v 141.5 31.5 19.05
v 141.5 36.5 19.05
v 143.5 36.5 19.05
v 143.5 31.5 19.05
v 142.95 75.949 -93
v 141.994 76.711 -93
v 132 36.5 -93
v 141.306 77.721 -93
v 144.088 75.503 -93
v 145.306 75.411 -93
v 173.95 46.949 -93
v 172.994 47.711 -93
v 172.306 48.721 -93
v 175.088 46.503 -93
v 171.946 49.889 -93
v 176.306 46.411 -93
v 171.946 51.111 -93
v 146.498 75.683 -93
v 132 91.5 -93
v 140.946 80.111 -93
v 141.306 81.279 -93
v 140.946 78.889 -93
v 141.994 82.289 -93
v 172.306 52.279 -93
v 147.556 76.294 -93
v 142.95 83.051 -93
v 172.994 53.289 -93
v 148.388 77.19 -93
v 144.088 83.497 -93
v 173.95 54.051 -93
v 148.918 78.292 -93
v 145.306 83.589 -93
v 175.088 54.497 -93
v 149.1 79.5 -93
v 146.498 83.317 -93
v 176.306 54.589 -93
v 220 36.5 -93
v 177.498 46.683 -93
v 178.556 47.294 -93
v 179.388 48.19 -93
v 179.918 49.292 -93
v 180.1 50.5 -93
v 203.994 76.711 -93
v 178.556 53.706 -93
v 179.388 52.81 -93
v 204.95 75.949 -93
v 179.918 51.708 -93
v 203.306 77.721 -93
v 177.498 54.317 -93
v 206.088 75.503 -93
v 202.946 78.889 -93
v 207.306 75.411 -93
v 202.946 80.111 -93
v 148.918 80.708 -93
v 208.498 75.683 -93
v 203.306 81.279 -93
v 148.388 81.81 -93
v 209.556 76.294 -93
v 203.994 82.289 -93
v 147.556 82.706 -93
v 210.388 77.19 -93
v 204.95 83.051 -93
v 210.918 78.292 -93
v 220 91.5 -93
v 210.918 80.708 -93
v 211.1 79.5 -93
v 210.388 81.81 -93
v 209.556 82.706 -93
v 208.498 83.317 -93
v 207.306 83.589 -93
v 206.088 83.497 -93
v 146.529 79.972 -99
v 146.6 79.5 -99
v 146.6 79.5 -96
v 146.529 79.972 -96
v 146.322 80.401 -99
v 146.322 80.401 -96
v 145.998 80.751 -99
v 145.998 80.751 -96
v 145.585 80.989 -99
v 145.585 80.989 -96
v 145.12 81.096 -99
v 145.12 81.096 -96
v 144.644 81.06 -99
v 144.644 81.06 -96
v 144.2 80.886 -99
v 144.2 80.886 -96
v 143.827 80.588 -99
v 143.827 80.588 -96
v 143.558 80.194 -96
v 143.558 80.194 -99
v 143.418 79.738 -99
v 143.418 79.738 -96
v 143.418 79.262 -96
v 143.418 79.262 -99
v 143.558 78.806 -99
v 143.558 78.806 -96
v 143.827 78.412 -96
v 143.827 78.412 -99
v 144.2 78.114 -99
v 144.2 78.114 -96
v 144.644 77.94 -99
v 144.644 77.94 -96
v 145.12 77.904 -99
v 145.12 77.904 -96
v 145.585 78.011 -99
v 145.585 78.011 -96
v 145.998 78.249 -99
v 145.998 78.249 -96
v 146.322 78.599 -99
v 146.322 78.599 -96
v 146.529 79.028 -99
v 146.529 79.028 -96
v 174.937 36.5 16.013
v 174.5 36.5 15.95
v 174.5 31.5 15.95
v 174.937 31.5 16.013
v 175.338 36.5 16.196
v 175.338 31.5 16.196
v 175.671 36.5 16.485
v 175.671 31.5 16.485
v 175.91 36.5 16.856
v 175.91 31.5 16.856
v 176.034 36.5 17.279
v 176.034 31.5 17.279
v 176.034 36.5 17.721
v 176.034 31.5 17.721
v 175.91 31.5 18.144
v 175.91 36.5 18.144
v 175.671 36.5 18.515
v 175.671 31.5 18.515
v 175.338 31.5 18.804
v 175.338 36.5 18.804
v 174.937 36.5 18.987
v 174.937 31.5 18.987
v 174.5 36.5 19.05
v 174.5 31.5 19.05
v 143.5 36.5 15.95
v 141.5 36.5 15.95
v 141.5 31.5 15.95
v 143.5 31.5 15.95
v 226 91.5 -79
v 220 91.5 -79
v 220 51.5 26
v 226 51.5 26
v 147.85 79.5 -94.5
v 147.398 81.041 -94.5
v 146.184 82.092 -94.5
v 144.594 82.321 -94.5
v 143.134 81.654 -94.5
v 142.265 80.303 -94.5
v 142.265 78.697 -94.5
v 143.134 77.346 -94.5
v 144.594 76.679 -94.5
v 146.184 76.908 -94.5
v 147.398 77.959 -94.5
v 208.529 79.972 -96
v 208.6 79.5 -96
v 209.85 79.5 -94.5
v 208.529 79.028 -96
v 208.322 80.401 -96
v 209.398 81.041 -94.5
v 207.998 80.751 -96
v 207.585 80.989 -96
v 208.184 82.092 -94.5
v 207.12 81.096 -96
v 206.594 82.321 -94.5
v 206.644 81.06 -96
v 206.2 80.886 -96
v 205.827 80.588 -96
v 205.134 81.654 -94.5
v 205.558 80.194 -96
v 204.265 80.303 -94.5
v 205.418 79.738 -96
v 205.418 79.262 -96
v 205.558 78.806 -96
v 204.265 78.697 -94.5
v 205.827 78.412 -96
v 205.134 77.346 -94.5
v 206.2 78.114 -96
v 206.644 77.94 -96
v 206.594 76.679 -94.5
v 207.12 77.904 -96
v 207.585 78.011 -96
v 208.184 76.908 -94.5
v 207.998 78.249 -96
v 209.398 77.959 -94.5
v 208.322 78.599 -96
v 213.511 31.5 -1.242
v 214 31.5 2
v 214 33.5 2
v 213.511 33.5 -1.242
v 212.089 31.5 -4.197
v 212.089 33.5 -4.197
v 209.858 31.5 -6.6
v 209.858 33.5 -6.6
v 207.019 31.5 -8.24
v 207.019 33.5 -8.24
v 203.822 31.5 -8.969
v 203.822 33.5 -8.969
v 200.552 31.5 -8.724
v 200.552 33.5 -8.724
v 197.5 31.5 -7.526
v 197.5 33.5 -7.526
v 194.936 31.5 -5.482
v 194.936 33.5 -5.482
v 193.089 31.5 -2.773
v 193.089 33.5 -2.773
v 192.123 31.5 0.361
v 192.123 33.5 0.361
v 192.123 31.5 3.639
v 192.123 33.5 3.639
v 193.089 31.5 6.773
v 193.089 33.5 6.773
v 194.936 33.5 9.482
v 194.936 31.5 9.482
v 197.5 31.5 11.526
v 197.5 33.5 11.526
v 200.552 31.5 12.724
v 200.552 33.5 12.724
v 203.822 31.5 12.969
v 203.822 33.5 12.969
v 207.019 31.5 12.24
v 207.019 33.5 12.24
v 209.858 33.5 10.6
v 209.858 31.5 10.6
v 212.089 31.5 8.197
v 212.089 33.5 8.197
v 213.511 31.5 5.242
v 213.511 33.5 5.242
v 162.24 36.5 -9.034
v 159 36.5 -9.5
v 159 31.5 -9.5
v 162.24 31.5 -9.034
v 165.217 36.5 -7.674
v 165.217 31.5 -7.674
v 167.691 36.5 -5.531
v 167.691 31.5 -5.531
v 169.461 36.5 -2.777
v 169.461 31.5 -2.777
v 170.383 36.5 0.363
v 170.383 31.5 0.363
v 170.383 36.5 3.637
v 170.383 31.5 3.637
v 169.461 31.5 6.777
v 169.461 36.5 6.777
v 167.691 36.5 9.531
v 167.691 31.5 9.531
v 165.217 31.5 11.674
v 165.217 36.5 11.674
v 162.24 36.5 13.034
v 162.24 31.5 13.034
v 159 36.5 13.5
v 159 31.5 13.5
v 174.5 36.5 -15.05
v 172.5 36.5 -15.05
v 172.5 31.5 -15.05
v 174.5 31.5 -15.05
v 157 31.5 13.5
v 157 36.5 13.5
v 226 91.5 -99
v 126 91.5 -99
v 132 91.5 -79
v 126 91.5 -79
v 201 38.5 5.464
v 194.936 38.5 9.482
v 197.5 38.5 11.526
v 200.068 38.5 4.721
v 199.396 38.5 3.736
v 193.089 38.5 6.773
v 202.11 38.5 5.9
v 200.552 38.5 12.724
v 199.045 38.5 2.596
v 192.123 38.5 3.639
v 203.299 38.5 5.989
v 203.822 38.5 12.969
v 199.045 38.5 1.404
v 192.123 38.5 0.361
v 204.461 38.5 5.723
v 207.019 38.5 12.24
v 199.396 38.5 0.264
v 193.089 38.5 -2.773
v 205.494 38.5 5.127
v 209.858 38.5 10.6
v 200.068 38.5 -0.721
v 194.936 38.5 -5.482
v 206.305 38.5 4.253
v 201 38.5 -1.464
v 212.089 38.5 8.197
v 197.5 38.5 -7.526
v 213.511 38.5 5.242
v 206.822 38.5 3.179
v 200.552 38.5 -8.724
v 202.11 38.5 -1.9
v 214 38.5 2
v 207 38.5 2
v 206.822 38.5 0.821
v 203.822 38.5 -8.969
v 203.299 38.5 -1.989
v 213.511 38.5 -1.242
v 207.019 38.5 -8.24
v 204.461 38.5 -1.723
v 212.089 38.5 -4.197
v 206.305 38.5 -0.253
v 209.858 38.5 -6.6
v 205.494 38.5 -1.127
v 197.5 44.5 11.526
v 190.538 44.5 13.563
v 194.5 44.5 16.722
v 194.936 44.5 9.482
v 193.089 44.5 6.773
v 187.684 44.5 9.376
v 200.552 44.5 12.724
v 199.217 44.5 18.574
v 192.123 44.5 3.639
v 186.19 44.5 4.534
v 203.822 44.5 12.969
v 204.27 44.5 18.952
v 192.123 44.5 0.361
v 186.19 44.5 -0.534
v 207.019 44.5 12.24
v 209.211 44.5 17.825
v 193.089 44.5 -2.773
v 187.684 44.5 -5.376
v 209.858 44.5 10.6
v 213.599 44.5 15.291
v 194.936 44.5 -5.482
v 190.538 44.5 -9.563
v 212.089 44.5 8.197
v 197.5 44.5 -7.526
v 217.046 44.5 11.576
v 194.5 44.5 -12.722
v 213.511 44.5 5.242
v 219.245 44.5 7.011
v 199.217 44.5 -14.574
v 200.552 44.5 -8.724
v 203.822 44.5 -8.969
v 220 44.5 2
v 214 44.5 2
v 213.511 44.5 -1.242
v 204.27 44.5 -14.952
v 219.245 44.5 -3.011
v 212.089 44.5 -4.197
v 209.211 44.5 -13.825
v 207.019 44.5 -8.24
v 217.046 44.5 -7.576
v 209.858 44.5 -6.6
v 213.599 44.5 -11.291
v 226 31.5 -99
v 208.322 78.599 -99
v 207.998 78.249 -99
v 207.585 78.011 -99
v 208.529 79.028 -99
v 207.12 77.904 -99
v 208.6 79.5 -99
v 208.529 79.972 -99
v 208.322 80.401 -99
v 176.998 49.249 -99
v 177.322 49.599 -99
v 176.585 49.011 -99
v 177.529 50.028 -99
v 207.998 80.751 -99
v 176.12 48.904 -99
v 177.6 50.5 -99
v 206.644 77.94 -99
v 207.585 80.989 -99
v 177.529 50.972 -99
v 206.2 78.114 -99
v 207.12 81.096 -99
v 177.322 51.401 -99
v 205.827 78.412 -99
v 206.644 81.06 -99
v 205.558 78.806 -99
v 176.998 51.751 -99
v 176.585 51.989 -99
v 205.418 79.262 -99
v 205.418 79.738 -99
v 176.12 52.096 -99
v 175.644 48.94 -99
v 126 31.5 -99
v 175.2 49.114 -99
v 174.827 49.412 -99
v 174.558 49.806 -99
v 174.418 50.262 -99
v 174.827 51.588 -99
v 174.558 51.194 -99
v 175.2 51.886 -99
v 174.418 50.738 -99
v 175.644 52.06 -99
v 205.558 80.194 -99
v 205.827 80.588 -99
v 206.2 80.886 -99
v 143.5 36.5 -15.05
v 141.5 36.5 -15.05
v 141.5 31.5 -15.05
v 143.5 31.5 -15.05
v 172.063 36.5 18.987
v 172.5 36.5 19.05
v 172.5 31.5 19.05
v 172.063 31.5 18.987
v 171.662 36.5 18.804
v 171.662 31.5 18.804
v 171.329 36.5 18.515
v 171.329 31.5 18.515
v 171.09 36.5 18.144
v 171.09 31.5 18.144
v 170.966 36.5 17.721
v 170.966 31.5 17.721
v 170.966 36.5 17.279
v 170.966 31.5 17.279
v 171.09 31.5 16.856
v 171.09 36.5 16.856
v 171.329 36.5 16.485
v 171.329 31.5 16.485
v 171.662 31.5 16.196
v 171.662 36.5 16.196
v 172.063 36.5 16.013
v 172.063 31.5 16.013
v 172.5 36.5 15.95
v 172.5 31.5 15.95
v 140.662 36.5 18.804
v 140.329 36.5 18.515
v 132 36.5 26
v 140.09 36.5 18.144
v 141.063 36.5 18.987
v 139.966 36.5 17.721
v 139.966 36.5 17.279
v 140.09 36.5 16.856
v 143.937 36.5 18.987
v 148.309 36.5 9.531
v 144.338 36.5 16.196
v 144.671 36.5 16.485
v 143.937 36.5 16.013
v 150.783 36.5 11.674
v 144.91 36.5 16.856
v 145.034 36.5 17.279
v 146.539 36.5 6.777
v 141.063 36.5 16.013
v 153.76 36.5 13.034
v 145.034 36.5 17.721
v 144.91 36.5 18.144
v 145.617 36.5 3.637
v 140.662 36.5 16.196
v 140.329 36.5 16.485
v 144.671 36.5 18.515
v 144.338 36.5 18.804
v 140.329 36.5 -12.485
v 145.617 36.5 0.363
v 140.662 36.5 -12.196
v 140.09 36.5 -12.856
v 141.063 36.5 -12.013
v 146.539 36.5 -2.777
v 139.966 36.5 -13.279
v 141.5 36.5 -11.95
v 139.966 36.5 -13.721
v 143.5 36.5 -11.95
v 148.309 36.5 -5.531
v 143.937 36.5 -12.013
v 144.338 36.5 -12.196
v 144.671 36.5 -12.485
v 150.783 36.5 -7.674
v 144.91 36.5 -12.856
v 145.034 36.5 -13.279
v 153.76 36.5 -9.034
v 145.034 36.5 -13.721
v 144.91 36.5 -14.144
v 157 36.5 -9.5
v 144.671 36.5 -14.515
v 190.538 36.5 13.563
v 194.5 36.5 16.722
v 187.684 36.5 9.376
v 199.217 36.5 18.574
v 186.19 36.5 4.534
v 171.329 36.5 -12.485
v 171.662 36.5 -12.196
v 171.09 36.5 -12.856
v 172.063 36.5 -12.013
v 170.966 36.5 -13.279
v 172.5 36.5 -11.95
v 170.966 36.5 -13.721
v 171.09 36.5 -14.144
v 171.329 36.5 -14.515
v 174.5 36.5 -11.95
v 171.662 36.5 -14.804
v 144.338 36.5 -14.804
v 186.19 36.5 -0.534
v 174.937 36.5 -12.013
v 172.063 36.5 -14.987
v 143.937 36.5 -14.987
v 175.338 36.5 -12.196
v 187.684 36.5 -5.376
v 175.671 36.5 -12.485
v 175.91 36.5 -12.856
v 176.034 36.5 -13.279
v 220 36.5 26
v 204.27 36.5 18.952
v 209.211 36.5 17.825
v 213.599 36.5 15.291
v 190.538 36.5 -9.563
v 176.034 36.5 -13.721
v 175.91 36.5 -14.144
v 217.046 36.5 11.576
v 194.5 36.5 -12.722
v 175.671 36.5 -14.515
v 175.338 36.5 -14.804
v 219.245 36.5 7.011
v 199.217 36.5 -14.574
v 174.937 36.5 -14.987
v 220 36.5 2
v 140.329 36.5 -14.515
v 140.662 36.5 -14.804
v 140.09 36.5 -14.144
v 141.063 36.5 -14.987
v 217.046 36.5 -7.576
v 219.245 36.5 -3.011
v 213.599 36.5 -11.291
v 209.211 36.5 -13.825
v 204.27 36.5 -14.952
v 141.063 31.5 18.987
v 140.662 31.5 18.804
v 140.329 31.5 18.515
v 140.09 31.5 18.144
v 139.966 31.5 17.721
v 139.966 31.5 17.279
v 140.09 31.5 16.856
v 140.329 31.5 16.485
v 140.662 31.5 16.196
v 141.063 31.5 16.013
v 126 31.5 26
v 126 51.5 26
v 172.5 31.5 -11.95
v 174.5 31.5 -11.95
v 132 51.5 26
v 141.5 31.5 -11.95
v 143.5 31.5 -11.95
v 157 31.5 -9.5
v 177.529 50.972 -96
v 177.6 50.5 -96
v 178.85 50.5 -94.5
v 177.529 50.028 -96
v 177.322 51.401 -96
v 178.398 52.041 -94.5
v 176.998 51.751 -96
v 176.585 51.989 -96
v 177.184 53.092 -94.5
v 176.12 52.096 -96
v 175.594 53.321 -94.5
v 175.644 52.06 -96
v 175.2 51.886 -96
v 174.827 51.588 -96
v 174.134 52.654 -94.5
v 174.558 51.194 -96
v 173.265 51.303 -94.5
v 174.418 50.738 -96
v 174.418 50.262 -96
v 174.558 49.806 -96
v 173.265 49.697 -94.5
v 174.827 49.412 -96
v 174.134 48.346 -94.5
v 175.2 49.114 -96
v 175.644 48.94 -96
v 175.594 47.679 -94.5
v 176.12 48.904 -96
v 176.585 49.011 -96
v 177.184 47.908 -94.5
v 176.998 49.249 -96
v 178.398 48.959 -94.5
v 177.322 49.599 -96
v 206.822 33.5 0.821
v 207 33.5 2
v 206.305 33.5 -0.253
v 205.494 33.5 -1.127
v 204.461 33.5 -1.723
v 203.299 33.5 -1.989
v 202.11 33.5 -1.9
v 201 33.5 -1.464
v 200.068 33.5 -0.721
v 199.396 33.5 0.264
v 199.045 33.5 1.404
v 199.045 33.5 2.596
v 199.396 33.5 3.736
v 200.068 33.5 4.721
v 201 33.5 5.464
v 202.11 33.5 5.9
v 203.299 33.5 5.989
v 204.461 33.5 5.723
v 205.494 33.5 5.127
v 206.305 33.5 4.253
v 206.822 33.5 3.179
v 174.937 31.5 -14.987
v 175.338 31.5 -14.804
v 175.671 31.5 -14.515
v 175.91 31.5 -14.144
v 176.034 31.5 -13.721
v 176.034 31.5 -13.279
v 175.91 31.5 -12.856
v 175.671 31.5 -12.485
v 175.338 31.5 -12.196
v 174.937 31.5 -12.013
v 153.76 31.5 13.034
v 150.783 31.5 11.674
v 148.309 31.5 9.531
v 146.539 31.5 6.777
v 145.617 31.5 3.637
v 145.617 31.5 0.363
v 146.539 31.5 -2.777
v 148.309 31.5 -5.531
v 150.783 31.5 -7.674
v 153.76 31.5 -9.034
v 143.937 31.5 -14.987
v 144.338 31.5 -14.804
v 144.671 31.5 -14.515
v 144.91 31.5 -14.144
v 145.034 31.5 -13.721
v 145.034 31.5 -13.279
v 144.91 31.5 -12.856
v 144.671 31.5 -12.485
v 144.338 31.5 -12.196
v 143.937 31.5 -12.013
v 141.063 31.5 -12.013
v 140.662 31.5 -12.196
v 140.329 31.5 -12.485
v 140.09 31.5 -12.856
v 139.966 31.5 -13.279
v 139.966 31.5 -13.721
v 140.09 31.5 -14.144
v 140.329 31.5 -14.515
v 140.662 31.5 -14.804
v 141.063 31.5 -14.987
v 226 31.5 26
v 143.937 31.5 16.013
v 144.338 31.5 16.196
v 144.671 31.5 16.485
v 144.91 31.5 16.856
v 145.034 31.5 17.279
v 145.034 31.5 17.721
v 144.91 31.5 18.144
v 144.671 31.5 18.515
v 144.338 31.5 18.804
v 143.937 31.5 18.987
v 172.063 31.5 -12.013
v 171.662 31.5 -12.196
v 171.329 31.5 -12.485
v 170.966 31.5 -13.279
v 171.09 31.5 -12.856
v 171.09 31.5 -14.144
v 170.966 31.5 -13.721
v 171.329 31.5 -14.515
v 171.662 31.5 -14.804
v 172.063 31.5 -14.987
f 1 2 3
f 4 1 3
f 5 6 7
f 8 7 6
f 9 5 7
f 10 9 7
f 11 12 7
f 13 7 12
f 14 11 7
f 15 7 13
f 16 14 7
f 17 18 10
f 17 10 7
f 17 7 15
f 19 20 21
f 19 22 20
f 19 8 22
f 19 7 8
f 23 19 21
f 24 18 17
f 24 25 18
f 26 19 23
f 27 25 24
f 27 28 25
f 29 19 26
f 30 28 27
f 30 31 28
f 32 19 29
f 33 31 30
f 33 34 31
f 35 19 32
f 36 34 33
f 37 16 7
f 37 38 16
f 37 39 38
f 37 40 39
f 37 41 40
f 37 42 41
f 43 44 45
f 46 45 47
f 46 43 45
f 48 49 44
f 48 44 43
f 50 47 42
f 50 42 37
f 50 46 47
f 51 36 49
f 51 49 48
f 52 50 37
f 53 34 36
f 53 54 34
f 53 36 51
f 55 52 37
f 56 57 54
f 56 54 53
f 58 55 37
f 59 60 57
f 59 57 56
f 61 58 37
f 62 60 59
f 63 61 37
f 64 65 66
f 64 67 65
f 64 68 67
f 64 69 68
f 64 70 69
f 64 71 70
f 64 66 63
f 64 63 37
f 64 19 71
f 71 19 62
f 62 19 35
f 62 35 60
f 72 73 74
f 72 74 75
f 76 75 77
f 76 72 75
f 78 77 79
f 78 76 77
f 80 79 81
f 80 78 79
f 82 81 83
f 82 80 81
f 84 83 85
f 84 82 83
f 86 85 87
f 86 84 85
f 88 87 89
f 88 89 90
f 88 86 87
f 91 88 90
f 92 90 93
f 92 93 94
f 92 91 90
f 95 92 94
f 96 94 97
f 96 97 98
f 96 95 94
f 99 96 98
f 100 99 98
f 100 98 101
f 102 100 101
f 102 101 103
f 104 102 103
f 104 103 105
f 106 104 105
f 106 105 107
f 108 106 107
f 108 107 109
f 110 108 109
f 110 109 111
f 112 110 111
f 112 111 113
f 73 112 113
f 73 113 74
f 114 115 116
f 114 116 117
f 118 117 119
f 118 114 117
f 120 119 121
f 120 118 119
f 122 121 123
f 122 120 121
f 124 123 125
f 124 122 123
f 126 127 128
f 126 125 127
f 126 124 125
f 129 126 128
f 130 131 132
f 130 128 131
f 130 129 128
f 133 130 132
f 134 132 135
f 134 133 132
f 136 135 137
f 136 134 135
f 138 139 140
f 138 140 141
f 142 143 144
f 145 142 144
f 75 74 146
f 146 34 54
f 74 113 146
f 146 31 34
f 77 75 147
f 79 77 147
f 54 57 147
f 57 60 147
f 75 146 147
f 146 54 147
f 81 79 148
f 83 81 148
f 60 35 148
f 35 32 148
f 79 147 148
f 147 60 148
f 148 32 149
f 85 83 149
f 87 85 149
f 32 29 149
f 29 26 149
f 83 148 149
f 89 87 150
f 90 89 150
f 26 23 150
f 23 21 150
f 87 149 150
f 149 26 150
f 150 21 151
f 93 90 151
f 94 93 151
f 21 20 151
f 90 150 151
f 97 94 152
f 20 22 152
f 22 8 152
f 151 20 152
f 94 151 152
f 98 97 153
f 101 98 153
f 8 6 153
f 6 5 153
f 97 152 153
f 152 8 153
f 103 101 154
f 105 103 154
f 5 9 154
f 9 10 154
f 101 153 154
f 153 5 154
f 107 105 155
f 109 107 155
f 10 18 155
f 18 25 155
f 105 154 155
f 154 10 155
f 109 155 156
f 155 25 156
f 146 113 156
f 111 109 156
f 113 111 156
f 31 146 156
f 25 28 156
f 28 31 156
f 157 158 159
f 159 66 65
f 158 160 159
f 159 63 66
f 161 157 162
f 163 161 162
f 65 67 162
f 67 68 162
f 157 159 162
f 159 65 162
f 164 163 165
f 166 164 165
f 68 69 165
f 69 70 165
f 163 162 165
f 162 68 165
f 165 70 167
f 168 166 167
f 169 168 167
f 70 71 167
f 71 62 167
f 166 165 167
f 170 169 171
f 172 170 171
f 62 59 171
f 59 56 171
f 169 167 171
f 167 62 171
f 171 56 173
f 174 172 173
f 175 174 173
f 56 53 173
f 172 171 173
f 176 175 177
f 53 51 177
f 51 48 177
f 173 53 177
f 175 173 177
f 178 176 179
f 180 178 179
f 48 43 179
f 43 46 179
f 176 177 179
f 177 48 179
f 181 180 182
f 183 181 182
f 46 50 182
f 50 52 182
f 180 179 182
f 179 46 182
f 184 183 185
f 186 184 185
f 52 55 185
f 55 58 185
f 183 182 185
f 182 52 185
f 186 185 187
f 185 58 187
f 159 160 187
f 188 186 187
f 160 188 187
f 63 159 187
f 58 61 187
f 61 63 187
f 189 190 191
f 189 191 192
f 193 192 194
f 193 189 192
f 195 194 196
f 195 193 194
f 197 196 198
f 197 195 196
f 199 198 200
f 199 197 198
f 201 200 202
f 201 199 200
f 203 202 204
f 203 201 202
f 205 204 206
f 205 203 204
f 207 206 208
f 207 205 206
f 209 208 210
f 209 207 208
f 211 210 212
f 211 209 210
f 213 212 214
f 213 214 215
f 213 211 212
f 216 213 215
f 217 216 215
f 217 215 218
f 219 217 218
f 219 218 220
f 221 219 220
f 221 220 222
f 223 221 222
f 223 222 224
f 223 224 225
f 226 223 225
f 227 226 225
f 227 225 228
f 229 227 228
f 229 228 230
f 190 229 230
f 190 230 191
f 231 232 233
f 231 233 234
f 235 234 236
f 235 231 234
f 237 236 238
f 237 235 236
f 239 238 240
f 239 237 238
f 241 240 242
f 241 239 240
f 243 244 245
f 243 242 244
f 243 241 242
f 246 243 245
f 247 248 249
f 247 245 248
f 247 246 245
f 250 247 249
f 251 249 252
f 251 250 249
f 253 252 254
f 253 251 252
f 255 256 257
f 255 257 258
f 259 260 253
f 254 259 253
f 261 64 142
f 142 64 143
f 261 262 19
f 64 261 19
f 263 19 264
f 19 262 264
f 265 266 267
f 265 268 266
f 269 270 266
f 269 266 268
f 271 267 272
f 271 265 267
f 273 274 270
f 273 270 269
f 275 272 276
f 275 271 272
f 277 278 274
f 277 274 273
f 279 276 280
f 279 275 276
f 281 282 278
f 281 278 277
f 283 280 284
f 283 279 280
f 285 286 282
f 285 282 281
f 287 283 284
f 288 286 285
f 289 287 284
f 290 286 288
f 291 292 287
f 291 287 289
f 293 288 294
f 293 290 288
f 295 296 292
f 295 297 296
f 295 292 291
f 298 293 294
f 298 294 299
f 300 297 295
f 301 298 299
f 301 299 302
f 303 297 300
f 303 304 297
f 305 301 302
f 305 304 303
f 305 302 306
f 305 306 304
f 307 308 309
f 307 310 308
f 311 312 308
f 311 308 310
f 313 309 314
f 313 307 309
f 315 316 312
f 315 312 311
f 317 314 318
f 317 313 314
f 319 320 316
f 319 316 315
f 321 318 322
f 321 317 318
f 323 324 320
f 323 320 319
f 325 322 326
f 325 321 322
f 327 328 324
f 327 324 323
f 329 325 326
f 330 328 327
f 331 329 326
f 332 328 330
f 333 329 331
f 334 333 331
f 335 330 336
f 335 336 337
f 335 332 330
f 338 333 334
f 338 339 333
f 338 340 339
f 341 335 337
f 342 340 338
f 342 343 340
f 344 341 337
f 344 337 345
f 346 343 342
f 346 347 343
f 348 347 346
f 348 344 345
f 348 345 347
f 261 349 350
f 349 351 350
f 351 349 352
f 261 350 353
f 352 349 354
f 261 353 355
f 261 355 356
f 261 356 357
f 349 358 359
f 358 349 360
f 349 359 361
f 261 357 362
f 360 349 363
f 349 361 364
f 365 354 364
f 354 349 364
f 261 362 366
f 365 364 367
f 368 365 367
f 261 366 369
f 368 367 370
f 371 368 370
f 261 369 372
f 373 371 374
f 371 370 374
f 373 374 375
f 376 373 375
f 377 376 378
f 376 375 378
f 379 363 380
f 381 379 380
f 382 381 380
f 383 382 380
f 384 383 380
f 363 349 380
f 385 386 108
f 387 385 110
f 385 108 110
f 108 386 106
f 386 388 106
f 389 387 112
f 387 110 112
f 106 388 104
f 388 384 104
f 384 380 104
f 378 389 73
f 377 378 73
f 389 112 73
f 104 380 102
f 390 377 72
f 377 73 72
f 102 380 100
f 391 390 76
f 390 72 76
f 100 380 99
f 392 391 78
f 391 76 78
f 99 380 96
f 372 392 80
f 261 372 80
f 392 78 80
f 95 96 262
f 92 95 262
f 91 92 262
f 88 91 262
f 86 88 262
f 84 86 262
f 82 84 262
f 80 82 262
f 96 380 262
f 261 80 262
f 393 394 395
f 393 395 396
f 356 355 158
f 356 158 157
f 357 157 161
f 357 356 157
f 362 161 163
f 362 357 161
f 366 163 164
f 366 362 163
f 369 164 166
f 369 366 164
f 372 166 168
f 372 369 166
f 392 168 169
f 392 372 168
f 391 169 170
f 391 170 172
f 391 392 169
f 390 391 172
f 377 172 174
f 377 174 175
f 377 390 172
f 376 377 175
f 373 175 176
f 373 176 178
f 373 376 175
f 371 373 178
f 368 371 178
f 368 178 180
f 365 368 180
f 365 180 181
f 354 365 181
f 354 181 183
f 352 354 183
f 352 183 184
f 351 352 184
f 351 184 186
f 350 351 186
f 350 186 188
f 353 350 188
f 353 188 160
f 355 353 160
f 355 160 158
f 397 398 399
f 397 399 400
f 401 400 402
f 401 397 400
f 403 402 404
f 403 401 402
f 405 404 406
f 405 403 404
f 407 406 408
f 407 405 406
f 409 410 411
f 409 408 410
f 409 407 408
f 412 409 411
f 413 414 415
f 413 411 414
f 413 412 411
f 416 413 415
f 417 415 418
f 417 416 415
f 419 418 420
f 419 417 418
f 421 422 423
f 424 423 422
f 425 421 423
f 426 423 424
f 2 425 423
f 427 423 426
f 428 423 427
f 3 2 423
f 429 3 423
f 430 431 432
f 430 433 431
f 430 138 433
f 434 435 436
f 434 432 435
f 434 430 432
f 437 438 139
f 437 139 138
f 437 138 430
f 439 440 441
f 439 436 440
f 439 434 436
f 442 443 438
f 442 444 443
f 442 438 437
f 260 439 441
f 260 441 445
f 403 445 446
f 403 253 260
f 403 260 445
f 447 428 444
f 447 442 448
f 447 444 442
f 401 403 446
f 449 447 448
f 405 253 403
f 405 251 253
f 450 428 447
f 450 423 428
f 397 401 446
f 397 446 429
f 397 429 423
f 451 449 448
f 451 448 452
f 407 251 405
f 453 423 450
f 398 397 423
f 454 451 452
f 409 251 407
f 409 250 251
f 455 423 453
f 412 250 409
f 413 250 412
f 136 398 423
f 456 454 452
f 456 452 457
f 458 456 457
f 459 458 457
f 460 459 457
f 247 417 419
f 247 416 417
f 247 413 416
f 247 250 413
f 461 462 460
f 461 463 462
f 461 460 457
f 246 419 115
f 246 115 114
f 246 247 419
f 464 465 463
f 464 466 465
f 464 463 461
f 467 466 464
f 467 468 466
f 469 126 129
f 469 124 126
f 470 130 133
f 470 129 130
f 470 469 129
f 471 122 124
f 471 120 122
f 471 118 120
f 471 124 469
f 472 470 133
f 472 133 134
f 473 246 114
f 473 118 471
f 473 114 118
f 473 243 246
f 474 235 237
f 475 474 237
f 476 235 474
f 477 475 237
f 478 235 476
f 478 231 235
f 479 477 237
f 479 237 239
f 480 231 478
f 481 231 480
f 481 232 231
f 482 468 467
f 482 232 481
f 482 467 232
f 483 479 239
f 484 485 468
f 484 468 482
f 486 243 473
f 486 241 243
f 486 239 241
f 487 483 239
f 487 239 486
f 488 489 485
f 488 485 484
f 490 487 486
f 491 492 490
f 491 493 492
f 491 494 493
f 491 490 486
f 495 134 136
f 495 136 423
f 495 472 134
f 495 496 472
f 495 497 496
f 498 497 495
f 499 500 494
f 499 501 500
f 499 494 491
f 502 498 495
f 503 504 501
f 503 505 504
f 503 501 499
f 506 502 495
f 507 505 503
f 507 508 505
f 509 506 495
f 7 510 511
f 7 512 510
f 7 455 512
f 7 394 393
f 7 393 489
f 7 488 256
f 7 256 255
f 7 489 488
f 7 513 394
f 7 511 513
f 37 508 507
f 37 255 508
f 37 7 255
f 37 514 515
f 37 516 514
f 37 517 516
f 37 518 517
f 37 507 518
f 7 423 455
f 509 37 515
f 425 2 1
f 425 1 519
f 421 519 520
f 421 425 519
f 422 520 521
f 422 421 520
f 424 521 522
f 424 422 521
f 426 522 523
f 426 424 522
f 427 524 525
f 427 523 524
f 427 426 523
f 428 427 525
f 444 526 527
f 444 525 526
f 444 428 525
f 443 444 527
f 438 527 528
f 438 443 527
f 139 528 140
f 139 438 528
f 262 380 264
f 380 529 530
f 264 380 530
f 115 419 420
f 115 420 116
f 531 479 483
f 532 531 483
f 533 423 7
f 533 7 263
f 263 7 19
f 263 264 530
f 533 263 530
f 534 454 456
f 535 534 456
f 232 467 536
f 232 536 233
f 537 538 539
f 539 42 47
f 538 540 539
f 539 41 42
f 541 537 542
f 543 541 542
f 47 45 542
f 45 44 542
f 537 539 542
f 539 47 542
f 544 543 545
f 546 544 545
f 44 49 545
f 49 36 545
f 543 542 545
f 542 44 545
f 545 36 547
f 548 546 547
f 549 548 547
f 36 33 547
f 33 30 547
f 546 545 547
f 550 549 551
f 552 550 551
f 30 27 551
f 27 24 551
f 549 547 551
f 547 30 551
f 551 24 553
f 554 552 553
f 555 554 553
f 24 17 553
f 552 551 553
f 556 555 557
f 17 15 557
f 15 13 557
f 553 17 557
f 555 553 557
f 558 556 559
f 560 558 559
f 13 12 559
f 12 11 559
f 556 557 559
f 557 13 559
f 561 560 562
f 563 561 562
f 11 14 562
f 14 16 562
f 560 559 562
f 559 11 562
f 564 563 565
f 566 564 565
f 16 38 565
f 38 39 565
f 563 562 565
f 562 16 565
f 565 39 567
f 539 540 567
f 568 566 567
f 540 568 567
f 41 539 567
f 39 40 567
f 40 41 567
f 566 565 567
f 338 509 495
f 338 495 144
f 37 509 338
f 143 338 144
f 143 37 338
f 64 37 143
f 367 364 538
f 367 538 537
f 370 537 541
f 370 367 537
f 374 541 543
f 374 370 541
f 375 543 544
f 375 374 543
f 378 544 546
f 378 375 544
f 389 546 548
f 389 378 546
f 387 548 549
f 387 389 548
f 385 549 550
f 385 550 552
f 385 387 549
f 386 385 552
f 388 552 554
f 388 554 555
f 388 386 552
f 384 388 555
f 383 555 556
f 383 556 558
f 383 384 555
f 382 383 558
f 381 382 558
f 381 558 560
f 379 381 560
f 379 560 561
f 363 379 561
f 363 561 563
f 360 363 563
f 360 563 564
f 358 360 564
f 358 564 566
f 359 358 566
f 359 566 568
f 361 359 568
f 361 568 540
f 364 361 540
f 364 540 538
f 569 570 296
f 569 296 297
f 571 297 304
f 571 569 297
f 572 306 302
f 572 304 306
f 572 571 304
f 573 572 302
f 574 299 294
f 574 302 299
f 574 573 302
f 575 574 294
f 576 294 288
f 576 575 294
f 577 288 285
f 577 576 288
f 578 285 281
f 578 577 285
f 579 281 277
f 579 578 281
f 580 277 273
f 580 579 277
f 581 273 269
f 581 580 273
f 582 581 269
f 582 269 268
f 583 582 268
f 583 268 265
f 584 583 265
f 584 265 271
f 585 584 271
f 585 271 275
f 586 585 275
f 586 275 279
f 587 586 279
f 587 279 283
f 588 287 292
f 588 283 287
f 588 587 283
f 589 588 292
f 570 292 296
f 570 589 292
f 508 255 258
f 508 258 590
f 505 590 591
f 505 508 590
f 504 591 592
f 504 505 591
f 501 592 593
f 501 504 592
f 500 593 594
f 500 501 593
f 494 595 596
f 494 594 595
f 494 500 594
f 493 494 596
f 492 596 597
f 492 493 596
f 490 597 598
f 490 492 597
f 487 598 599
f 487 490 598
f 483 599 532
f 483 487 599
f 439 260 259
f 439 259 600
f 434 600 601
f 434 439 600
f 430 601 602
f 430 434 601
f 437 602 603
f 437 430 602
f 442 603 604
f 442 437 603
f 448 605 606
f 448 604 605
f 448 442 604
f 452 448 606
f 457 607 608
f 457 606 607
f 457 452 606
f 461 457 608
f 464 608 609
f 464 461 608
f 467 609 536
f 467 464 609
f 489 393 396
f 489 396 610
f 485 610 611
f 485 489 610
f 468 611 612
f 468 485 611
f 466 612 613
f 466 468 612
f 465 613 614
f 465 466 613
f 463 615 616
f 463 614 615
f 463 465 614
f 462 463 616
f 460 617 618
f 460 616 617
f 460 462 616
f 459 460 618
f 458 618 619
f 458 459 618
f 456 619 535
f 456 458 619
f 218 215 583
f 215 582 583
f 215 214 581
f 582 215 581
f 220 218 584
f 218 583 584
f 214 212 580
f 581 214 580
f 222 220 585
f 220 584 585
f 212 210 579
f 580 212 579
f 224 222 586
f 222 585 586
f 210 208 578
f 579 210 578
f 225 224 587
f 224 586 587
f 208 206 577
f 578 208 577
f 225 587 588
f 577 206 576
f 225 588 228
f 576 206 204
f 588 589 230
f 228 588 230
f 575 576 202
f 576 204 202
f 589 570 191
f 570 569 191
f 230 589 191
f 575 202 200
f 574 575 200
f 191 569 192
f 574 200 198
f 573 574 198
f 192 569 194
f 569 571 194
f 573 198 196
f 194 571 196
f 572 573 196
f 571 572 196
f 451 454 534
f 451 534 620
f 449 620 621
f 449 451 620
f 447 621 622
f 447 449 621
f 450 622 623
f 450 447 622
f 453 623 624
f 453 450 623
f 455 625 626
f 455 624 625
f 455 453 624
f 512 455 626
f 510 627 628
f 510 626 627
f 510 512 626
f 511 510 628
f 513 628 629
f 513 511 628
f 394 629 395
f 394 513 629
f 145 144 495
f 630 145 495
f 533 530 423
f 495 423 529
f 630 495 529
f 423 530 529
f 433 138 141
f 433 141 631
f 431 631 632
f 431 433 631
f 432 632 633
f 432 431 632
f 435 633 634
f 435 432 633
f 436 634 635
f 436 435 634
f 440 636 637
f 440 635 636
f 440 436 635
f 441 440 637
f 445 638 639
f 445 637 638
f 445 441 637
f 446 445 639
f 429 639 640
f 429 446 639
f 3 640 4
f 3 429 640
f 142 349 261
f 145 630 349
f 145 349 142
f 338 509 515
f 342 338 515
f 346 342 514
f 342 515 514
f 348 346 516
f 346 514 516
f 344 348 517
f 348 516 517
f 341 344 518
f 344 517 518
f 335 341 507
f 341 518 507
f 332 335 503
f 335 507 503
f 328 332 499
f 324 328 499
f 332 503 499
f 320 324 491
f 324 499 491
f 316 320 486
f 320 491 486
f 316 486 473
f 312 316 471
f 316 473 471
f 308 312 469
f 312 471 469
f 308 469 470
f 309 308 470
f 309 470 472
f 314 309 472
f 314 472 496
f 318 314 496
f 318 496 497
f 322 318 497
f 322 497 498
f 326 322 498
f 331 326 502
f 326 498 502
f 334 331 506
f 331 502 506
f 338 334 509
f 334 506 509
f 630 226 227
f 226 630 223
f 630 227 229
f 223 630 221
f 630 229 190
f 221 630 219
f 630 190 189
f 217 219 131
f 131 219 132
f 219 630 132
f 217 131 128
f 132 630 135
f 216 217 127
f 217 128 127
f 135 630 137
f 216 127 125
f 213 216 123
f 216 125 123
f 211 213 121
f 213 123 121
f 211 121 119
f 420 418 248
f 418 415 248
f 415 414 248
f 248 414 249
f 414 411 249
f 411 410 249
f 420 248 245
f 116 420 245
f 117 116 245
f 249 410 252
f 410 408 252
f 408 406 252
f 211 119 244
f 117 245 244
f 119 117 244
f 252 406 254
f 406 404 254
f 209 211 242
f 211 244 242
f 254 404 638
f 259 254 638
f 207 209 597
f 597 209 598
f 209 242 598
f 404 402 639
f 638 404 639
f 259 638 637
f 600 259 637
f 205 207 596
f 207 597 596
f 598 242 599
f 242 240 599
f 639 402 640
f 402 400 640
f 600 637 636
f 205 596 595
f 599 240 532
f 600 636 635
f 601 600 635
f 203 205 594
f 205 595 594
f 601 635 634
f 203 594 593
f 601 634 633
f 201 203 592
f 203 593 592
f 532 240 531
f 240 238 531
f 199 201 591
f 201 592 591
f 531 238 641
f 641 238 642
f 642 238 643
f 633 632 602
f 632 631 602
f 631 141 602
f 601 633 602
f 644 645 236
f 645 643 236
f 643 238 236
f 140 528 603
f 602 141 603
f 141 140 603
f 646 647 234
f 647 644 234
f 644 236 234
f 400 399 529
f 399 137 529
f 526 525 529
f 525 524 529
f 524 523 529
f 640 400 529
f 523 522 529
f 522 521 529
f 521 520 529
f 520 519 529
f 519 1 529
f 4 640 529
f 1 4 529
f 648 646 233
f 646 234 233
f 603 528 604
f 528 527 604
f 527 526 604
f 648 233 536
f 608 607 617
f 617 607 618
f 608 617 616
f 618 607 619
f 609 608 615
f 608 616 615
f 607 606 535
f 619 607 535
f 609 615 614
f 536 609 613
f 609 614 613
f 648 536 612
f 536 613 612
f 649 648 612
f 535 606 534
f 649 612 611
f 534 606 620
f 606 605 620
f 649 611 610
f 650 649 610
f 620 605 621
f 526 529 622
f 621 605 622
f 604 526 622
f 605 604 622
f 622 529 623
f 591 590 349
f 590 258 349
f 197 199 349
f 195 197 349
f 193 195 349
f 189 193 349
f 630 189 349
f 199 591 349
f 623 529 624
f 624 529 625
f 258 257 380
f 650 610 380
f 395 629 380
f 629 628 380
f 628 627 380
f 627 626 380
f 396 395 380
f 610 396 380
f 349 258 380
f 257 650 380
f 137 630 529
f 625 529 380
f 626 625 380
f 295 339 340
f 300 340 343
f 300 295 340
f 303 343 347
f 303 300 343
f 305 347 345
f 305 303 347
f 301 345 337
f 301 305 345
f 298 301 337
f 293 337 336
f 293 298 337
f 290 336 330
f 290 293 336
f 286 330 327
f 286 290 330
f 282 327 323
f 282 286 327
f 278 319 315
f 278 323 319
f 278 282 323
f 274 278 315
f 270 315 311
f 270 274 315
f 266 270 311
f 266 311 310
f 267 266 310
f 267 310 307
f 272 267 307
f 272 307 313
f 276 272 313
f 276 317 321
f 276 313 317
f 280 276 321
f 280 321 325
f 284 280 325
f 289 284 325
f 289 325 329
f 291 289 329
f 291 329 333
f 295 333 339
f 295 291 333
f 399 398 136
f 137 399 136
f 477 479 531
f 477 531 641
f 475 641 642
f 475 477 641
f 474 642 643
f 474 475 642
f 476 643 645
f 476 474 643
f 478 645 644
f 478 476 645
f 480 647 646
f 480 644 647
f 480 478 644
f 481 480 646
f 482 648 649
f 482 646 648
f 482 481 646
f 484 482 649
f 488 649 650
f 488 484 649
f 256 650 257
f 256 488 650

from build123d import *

# Parameters (mm, degrees)
CYLINDER040_R     = 11
CYLINDER040_DEPTH = 8
CYLINDER041_R     = 4
CYLINDER041_DEPTH = 34
CYLINDER046_R     = 1.6
CYLINDER046_DEPTH = 10
EXTRUDE031_DEPTH  = 10
CYLINDER039_R     = 11
CYLINDER039_DEPTH = 8
BOX010_W          = 88
BOX010_H          = 60
BOX010_DEPTH      = 128
EXTRUDE005_DEPTH  = 100
CYLINDER038_R     = 17
CYLINDER038_DEPTH = 8


with BuildPart() as cilindro040:
    # Cylinder040 → Cylinder040 (new body)
    with BuildSketch(Plane(origin=(203, 25, 2), x_dir=(1, 0, 0), z_dir=(0, 1, 0))):
        Circle(CYLINDER040_R)
    extrude(amount=CYLINDER040_DEPTH)


with BuildPart() as cilindro041:
    # Cylinder041 → Cylinder041 (new body)
    with BuildSketch(Plane(origin=(203, 8, 2), x_dir=(1, 0, 0), z_dir=(0, 1, 0))):
        Circle(CYLINDER041_R)
    extrude(amount=CYLINDER041_DEPTH)


with BuildPart() as cono:
    # Cone → Cone (revolve)
    with BuildSketch(Plane(origin=(0, 0, -96), x_dir=(1, 0, 0), z_dir=(0, -1, 0))):
        Polygon((0, 0), (1.6, 0), (4.1, 3), (0, 3), align=None)
    revolve(axis=Axis((0, 0, -96), (0, 0, 1)))


with BuildPart() as cilindro046:
    # Cylinder046 → Cylinder046 (new body)
    with BuildSketch(Plane.XY.offset(-106)):
        Circle(CYLINDER046_R)
    extrude(amount=CYLINDER046_DEPTH)


with BuildPart() as fusion030:
    # Fusion030 base: copy of Cilindro046
    add(cilindro046.part)

    # Fusion030: union Cono
    add(cono.part)


with BuildPart() as fusion030_1:
    # Fusion030 placement: moved
    add(fusion030.part.moved(Location((207, 66, 0))))


with BuildPart() as fusion031:
    # Fusion031 base: copy of Cilindro046
    add(cilindro046.part)

    # Fusion031: union Cono
    add(cono.part)


with BuildPart() as fusion031_1:
    # Fusion031 placement: moved
    add(fusion031.part.moved(Location((145, 66, 0))))


with BuildPart() as fusion032:
    # Fusion032 base: copy of Cilindro046
    add(cilindro046.part)

    # Fusion032: union Cono
    add(cono.part)


with BuildPart() as fusion032_1:
    # Fusion032 placement: moved
    add(fusion032.part.moved(Location((176, 37, 0))))


with BuildPart() as extrude031:
    # Sketch023 → Extrude031 (new body)
    with BuildSketch(Plane.XZ):
        with BuildLine():
            ThreePointArc((-1, 11.5), (-12.5, 0), (-1, -11.5))
            Line((-1, -11.5), (1, -11.5))
            ThreePointArc((1, -11.5), (12.5, 0), (1, 11.5))
            Line((-1, 11.5), (1, 11.5))
        make_face()
        with BuildLine():
            ThreePointArc((-16.5, 17.05), (-18.05, 15.5), (-16.5, 13.95))
            Line((-16.5, 13.95), (-14.5, 13.95))
            ThreePointArc((-14.5, 13.95), (-12.95, 15.5), (-14.5, 17.05))
            Line((-16.5, 17.05), (-14.5, 17.05))
        make_face()
        with BuildLine():
            ThreePointArc((14.5, 17.05), (12.95, 15.5), (14.5, 13.95))
            Line((14.5, 13.95), (16.5, 13.95))
            ThreePointArc((16.5, 13.95), (18.05, 15.5), (16.5, 17.05))
            Line((14.5, 17.05), (16.5, 17.05))
        make_face()
        with BuildLine():
            ThreePointArc((-16.5, -13.95), (-18.05, -15.5), (-16.5, -17.05))
            Line((-16.5, -17.05), (-14.5, -17.05))
            ThreePointArc((-14.5, -17.05), (-12.95, -15.5), (-14.5, -13.95))
            Line((-16.5, -13.95), (-14.5, -13.95))
        make_face()
        with BuildLine():
            ThreePointArc((14.5, -13.95), (12.95, -15.5), (14.5, -17.05))
            Line((14.5, -17.05), (16.499986, -17.05))
            ThreePointArc((16.499986, -17.05), (18.05, -15.500007), (16.5, -13.95))
            Line((14.5, -13.95), (16.5, -13.95))
        make_face()
    extrude(amount=EXTRUDE031_DEPTH)


with BuildPart() as extrude031_1:
    # Extrude031 placement: moved
    add(extrude031.part.moved(Location((158, 25, 2))))


with BuildPart() as fusion012:
    # Cylinder039 → Cylinder039 (new body)
    with BuildSketch(Plane(origin=(203, 12, 2), x_dir=(1, 0, 0), z_dir=(0, 1, 0))):
        Circle(CYLINDER039_R)
    extrude(amount=CYLINDER039_DEPTH)

    # Fusion012: union Cilindro040, Cilindro041, Fusion030, Fusion031, Fusion032, Extrude031
    add(cilindro040.part)
    add(cilindro041.part)
    add(fusion030_1.part)
    add(fusion031_1.part)
    add(fusion032_1.part)
    add(extrude031_1.part)


with BuildPart() as cubo009:
    # Box010 → Box010 (new body)
    with BuildSketch(Plane(origin=(132, 23, -93), x_dir=(1, 0, 0), z_dir=(0, 0, 1))):
        with Locations((44, 30)):
            Rectangle(BOX010_W, BOX010_H)
    extrude(amount=BOX010_DEPTH)


with BuildPart() as cut010:
    # Sketch005 → Extrude005 (new body)
    with BuildSketch(Plane.YZ.offset(126)):
        Polygon((18, 26), (18, -99), (78, -99), (78, -79), (38, 26), align=None)
    extrude(amount=EXTRUDE005_DEPTH)

    # Cut010: cut Cubo009
    add(cubo009.part, mode=Mode.SUBTRACT)


with BuildPart() as soporte_motor:
    # Cylinder038 → Cylinder038 (new body)
    with BuildSketch(Plane(origin=(203, 23, 2), x_dir=(1, 0, 0), z_dir=(0, 1, 0))):
        Circle(CYLINDER038_R)
    extrude(amount=CYLINDER038_DEPTH)

    # Fusion013: union Cut010
    add(cut010.part)

    # Cut008: cut Fusion012
    add(fusion012.part, mode=Mode.SUBTRACT)


with BuildPart() as soporte_motor_1:
    # Cut008 placement: moved
    add(soporte_motor.part.moved(Location((0, 13.5, 0))))


solid = soporte_motor_1.part
